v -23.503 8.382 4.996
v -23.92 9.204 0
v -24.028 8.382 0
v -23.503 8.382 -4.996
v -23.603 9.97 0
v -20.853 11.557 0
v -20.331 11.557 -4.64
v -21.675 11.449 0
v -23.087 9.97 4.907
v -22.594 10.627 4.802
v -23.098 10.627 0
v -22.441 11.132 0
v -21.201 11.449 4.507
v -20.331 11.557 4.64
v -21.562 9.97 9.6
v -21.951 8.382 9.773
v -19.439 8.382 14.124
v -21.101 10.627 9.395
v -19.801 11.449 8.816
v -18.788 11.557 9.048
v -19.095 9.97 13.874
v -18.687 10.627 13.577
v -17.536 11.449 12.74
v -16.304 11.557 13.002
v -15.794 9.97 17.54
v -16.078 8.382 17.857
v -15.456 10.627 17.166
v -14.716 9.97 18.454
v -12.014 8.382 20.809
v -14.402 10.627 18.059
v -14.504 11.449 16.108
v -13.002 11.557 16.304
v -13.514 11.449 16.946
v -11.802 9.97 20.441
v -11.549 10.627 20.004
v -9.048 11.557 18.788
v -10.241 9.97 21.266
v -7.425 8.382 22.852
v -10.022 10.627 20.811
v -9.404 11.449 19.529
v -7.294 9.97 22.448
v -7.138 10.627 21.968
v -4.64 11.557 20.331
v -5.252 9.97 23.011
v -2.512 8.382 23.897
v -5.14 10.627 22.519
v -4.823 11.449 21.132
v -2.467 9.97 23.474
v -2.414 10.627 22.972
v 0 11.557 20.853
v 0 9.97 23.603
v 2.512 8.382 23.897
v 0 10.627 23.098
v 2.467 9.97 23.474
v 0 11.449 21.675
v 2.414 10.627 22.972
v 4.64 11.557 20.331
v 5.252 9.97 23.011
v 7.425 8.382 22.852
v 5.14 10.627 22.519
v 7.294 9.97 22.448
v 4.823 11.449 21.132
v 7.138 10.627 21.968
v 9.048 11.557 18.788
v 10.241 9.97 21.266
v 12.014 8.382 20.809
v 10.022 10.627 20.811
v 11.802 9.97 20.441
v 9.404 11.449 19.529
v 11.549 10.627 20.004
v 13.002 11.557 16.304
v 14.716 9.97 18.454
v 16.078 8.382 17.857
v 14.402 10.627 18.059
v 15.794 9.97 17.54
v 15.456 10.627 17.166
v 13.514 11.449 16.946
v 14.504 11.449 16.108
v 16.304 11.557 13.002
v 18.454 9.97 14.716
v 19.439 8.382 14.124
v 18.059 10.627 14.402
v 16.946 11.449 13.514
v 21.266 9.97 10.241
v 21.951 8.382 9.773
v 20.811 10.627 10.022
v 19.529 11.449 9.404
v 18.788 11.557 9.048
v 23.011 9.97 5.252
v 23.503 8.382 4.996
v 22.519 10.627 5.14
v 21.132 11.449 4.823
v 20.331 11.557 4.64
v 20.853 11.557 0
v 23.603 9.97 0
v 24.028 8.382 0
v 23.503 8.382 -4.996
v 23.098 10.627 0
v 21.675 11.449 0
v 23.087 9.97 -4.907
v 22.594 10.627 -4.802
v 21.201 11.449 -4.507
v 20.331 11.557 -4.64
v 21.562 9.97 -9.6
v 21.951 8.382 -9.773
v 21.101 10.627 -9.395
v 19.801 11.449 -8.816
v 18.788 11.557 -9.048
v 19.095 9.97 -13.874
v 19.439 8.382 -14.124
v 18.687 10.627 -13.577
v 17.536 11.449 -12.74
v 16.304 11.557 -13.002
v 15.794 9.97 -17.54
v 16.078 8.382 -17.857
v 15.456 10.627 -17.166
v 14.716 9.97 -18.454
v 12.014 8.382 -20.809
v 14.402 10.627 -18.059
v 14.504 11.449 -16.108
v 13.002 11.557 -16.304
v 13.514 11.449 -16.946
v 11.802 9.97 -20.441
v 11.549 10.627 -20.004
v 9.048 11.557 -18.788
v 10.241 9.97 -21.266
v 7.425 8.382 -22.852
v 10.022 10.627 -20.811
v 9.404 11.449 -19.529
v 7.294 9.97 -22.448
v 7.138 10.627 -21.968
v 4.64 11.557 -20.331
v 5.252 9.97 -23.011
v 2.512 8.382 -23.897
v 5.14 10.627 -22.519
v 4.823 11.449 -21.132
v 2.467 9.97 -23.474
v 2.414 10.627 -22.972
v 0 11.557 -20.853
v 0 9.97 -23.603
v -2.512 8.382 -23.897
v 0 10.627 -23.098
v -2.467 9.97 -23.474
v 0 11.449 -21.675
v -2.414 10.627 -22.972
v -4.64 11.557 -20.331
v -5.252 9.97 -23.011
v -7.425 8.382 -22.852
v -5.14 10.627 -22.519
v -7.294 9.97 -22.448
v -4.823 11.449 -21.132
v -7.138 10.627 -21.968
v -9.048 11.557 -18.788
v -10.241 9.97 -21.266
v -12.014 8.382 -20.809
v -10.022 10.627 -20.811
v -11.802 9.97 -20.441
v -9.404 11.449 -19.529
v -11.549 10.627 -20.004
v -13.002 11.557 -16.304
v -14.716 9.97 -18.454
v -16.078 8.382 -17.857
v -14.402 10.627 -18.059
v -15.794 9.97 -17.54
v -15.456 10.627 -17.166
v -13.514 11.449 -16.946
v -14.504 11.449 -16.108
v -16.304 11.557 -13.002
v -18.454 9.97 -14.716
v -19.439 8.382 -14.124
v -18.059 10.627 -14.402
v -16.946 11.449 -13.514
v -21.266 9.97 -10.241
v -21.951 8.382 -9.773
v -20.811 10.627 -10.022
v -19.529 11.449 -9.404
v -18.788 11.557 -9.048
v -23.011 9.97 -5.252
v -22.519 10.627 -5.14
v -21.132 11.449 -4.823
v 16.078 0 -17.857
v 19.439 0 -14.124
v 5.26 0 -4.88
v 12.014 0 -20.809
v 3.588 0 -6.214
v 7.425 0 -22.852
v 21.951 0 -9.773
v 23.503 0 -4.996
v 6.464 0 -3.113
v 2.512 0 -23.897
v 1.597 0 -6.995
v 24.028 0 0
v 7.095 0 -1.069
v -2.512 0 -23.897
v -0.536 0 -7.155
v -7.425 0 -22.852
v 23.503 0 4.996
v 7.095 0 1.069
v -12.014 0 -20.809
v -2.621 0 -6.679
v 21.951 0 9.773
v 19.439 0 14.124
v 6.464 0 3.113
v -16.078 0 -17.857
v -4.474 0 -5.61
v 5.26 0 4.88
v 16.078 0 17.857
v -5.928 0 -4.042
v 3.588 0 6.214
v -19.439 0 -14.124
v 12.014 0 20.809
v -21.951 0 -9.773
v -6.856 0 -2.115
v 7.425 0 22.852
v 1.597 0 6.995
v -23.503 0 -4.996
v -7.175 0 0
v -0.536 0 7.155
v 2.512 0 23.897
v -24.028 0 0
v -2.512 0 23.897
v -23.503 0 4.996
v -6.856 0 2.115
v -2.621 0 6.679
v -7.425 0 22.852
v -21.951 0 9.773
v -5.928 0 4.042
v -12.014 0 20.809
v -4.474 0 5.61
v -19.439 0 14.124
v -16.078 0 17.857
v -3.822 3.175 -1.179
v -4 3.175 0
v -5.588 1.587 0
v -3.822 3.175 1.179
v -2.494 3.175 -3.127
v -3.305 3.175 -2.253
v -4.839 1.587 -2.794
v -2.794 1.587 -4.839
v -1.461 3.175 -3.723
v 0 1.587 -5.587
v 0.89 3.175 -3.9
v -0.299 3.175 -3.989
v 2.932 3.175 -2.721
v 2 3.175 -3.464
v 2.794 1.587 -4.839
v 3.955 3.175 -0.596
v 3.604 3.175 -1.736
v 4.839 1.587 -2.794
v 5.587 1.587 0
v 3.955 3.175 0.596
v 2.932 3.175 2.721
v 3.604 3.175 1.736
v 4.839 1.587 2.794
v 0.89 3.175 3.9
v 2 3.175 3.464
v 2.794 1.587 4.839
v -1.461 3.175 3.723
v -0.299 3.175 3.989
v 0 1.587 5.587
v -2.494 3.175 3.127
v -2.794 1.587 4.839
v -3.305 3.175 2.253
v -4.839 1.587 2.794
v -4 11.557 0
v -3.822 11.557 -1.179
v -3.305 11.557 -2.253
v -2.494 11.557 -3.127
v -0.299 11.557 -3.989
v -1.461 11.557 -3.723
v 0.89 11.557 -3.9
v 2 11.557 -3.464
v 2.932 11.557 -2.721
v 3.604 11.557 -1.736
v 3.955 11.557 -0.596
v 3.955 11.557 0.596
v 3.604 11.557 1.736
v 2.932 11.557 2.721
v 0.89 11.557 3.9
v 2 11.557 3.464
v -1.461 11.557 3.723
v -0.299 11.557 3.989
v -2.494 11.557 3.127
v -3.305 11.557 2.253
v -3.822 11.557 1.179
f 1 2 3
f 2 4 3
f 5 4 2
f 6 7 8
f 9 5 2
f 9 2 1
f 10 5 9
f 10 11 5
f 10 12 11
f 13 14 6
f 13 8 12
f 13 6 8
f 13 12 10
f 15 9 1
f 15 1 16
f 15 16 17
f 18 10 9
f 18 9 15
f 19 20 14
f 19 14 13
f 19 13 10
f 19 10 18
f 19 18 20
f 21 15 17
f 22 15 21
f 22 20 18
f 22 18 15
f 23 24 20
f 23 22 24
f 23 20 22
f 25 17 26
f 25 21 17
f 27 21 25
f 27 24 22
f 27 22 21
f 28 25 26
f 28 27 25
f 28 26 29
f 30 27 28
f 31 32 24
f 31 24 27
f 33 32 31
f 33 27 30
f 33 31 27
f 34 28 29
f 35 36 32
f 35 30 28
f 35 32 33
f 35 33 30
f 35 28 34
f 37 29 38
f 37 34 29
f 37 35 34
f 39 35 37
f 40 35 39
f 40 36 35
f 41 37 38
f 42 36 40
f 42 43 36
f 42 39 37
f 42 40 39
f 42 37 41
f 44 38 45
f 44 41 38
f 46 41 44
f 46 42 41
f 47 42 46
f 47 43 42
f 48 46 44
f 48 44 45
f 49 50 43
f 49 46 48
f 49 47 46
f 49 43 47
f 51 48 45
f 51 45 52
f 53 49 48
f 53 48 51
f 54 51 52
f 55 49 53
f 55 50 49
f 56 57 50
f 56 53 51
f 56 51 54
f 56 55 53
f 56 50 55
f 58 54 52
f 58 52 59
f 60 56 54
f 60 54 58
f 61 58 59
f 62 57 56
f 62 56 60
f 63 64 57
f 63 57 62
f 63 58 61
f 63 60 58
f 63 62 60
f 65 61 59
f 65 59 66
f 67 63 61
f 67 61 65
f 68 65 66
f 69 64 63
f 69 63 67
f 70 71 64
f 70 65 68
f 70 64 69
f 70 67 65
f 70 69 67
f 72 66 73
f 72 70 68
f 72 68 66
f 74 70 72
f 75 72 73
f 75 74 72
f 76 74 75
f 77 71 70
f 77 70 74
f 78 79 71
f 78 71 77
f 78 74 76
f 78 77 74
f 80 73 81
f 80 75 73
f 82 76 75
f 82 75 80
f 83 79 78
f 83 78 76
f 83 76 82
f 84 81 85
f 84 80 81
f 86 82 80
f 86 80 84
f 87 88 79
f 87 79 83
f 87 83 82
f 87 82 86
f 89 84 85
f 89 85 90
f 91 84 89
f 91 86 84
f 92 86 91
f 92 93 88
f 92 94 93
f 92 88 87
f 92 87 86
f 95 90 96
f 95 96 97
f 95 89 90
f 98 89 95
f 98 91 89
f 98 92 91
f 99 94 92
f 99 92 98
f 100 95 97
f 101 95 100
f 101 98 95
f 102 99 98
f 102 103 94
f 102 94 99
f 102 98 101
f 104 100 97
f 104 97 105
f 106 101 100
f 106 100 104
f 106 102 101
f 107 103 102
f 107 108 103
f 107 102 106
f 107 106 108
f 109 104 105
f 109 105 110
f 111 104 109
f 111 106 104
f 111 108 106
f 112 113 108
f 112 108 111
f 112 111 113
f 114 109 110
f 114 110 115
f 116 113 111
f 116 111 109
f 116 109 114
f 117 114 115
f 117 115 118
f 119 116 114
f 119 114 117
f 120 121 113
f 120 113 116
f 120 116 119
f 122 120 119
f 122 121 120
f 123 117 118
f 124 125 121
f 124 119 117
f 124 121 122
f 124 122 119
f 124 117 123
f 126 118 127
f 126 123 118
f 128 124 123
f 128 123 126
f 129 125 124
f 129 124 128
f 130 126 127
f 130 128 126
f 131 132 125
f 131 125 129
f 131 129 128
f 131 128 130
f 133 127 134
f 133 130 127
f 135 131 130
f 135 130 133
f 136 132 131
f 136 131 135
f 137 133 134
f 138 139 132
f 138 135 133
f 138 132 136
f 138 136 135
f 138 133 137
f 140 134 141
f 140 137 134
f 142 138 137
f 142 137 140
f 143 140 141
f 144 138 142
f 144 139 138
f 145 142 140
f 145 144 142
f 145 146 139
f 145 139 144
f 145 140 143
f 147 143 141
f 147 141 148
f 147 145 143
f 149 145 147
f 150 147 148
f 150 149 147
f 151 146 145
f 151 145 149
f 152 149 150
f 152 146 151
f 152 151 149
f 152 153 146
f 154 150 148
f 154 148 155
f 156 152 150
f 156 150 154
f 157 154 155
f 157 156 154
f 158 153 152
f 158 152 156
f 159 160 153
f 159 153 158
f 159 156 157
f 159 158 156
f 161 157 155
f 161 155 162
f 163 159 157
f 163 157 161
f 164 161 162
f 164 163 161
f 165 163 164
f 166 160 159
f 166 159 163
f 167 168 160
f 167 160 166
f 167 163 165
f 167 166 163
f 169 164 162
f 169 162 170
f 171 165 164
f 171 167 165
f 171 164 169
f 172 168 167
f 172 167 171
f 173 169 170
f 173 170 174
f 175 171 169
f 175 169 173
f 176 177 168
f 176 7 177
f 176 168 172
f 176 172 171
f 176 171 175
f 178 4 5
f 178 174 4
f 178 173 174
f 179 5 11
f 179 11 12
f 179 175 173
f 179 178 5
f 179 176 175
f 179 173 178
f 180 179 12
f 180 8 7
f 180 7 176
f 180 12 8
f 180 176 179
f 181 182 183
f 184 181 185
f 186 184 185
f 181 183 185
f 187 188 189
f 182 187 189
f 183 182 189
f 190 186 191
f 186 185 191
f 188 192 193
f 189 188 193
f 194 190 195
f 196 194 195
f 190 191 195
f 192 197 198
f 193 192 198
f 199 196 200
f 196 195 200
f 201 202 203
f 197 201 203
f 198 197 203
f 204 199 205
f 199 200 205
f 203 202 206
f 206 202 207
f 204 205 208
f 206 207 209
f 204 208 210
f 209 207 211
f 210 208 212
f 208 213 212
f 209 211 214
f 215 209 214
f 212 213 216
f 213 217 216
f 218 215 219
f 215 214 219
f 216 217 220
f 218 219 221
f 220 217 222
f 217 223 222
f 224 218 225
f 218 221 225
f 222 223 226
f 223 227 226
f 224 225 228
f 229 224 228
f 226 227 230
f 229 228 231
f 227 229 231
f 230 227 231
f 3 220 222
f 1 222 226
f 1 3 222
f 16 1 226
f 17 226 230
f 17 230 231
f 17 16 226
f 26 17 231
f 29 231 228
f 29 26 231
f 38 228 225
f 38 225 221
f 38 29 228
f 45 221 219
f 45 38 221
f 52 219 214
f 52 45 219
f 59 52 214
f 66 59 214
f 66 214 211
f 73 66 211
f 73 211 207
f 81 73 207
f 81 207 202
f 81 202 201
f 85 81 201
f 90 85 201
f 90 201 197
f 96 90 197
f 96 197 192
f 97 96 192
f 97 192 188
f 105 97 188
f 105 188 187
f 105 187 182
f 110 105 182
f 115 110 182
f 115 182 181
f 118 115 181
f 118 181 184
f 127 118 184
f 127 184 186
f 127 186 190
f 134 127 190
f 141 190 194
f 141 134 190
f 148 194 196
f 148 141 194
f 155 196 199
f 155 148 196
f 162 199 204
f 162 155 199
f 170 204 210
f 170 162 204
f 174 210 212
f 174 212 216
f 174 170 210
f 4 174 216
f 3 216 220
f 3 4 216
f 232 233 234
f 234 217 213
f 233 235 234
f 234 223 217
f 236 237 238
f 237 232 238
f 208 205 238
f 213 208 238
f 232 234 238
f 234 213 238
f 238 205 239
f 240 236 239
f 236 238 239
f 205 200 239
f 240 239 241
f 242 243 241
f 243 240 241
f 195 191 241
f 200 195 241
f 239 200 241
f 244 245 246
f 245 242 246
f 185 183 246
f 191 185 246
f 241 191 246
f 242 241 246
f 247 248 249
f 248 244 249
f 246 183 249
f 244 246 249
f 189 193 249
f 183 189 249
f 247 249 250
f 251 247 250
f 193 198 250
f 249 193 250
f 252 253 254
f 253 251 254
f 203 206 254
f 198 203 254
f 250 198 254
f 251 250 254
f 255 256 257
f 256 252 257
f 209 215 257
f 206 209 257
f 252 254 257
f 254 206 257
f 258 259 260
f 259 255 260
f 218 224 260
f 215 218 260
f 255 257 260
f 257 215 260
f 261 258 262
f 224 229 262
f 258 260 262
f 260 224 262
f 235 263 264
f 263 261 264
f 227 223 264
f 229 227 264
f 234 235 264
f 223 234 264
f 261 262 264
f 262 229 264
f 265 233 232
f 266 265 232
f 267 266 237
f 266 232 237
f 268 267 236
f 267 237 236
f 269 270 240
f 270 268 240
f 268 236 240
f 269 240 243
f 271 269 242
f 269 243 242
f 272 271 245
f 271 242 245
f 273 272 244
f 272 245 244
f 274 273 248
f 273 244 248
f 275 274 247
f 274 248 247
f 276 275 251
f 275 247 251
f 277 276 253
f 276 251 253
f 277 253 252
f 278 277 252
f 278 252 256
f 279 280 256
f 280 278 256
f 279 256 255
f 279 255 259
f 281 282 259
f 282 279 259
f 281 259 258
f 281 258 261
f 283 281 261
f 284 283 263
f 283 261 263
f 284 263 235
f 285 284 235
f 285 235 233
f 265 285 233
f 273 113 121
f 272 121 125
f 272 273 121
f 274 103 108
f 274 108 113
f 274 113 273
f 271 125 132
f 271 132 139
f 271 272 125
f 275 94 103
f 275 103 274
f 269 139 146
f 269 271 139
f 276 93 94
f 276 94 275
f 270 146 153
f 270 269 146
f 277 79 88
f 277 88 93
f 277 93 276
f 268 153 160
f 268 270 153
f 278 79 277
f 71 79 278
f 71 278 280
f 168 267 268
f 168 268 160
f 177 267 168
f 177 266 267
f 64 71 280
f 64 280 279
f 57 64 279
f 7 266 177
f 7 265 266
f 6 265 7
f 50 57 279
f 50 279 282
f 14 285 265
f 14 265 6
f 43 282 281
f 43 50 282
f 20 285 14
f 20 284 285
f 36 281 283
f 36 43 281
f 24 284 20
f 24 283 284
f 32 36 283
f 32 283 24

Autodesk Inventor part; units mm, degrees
ref_plane "YZ Plane" through (0, 0, 0) normal (1, 0, 0) x (0, 1, 0)
ref_plane "XZ Plane" through (0, 0, 0) normal (0, 1, 0) x (-1, 0, 0)
ref_plane "XY Plane" through (0, 0, 0) normal (0, 0, 1) x (1, 0, 0)
sketch "Sketch1" plane through (0, 0, 0) normal (0, 0, 1) x (1, 0, 0)
  line L0 (0, 0) -> (0, 7.5879)
  line L1 (-24.0284, 0) -> (-24.0284, 11.557)
  line L2 (-24.0284, 11.557) -> (-4, 11.557)
  line L3 (-4, 11.557) -> (-4, 0)
  line L4 (-24.0284, 0) -> (-4, 0)
  dimension "d0" = 48.0568
  dimension "d2" = 8
  dimension "d3" = 11.557
revolve "Revolution1" add sketch "Sketch1" angle 360 about axis through (0, 0, 0) along (0, 1, 0)
fillet "Fillet1" radius 3.175 1 edges at (24.0284, 11.557, 0)
chamfer "Chamfer1" distance 3.175 angle 45 1 edges at (4, 0, 0)
properties part number "SMALL-MAGNET" material "Steel, Alloy"
